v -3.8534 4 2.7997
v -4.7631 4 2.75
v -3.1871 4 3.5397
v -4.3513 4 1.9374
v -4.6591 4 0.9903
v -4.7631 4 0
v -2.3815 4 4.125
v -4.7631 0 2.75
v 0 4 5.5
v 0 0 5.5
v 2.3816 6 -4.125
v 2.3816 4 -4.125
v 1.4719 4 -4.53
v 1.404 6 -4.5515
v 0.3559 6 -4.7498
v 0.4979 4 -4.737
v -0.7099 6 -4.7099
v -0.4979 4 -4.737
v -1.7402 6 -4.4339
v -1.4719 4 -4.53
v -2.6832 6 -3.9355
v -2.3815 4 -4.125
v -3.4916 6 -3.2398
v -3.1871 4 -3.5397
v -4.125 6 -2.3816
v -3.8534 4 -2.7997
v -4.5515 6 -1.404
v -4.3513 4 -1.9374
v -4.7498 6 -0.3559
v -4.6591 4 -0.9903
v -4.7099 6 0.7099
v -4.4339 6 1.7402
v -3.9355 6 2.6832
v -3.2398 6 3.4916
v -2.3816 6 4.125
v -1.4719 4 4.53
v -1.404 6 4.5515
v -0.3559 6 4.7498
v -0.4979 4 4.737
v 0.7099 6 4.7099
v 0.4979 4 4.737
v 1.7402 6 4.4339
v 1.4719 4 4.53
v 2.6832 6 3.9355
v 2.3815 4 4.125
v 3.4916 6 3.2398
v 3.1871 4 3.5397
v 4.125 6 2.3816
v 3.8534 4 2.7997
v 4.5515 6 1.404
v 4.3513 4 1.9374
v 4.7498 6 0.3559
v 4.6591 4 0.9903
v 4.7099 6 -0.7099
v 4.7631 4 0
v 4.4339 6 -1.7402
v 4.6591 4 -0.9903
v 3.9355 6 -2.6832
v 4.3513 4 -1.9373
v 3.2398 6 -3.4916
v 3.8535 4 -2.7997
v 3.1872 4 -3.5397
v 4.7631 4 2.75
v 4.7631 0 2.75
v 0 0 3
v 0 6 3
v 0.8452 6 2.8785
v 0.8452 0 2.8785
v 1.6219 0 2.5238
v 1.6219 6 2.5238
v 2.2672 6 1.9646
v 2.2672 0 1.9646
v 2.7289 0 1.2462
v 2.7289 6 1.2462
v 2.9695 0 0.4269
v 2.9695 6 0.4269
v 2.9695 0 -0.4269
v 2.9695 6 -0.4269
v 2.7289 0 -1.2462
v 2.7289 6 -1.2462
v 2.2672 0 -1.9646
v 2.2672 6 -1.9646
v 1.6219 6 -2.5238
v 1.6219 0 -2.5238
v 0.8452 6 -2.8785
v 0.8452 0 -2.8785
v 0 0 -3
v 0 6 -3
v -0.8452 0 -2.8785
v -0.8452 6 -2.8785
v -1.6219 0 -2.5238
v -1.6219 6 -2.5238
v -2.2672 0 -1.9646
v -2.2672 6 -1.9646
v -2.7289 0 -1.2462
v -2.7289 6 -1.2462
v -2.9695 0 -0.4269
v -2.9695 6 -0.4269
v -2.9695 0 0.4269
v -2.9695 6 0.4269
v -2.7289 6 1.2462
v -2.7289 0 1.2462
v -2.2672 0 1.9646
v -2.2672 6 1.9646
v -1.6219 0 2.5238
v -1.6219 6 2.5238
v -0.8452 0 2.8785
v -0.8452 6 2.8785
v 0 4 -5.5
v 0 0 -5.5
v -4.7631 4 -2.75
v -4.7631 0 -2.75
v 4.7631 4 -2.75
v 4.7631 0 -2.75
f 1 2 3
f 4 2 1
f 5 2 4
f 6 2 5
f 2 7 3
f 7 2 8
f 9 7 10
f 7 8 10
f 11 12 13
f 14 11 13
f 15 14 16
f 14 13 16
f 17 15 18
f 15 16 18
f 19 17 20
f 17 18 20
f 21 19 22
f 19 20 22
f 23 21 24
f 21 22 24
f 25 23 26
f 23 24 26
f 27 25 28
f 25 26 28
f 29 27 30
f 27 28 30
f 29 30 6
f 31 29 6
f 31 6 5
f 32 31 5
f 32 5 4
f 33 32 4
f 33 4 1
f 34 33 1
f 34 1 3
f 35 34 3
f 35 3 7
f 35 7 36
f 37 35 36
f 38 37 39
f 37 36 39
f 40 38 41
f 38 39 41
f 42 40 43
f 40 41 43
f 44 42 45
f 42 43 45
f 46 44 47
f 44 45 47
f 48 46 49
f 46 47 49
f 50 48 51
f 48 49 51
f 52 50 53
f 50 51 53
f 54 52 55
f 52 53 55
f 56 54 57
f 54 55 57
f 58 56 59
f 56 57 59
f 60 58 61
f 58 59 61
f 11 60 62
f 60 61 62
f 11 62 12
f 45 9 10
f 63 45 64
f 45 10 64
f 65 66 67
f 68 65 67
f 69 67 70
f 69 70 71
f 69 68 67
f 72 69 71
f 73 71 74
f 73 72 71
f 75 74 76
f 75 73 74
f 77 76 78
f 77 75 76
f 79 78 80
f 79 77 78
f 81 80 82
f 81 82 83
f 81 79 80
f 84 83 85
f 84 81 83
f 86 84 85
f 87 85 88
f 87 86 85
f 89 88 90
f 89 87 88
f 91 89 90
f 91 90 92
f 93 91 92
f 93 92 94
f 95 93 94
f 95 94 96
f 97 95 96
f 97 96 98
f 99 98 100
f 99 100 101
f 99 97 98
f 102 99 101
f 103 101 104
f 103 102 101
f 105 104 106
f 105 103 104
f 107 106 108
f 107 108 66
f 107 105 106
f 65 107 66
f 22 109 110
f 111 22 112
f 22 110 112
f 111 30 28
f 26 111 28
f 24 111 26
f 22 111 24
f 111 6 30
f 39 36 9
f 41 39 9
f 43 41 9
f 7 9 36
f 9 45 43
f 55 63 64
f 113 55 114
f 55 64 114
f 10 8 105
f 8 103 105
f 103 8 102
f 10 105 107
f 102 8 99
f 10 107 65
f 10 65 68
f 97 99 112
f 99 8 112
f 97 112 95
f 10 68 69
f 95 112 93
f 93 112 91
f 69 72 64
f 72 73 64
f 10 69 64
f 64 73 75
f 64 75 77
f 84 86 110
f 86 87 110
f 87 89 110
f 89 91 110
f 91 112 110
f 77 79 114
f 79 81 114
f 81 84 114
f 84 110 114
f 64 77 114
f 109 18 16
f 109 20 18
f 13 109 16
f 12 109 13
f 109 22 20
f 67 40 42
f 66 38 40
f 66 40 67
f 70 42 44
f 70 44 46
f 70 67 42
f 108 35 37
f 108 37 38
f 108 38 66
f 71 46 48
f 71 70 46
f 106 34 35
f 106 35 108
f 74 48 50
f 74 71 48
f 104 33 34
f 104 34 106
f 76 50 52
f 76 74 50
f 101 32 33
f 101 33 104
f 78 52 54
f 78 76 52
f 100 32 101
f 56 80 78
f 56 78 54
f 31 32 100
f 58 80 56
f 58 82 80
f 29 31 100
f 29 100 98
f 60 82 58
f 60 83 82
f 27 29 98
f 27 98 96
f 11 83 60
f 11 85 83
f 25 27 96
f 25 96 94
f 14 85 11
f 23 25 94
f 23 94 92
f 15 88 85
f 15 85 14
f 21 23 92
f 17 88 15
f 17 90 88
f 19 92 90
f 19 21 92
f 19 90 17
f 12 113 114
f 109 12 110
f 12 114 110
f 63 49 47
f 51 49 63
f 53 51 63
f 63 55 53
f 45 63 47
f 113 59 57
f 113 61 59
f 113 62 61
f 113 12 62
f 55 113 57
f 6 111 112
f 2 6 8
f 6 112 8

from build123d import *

# Parameters (mm, degrees)
SKETCH1_R           = 3
BOSS_EXTRUDE1_DEPTH = 4
SKETCH2_R           = 4.763139721
SKETCH2_R_2         = 3
BOSS_EXTRUDE2_DEPTH = 2


with BuildPart() as part:
    # Sketch1 → Boss-Extrude1 (new body)
    with BuildSketch(Plane(origin=(0, 0, 0), x_dir=(1, 0, 0), z_dir=(0, 1, 0))):
        Polygon((0, 5.5), (-4.763139721, 2.75), (-4.763139721, -2.75), (0, -5.5), (4.763139721, -2.75), (4.763139721, 2.75), align=None)
        with Locations(Location((0, 0, 0), (0, 0, 270))):
            Circle(SKETCH1_R, mode=Mode.SUBTRACT)
    extrude(amount=BOSS_EXTRUDE1_DEPTH)

    # Sketch2 → Boss-Extrude2 (add)
    with BuildSketch(Plane(origin=(0, 4, 0), x_dir=(1, 0, 0), z_dir=(0, 1, 0))):
        with Locations(Location((0, 0, 0), (0, 0, 60))):
            Circle(SKETCH2_R)
        with Locations(Location((0, 0, 0), (0, 0, 270))):
            Circle(SKETCH2_R_2, mode=Mode.SUBTRACT)
    extrude(amount=BOSS_EXTRUDE2_DEPTH)


solid = part.part
